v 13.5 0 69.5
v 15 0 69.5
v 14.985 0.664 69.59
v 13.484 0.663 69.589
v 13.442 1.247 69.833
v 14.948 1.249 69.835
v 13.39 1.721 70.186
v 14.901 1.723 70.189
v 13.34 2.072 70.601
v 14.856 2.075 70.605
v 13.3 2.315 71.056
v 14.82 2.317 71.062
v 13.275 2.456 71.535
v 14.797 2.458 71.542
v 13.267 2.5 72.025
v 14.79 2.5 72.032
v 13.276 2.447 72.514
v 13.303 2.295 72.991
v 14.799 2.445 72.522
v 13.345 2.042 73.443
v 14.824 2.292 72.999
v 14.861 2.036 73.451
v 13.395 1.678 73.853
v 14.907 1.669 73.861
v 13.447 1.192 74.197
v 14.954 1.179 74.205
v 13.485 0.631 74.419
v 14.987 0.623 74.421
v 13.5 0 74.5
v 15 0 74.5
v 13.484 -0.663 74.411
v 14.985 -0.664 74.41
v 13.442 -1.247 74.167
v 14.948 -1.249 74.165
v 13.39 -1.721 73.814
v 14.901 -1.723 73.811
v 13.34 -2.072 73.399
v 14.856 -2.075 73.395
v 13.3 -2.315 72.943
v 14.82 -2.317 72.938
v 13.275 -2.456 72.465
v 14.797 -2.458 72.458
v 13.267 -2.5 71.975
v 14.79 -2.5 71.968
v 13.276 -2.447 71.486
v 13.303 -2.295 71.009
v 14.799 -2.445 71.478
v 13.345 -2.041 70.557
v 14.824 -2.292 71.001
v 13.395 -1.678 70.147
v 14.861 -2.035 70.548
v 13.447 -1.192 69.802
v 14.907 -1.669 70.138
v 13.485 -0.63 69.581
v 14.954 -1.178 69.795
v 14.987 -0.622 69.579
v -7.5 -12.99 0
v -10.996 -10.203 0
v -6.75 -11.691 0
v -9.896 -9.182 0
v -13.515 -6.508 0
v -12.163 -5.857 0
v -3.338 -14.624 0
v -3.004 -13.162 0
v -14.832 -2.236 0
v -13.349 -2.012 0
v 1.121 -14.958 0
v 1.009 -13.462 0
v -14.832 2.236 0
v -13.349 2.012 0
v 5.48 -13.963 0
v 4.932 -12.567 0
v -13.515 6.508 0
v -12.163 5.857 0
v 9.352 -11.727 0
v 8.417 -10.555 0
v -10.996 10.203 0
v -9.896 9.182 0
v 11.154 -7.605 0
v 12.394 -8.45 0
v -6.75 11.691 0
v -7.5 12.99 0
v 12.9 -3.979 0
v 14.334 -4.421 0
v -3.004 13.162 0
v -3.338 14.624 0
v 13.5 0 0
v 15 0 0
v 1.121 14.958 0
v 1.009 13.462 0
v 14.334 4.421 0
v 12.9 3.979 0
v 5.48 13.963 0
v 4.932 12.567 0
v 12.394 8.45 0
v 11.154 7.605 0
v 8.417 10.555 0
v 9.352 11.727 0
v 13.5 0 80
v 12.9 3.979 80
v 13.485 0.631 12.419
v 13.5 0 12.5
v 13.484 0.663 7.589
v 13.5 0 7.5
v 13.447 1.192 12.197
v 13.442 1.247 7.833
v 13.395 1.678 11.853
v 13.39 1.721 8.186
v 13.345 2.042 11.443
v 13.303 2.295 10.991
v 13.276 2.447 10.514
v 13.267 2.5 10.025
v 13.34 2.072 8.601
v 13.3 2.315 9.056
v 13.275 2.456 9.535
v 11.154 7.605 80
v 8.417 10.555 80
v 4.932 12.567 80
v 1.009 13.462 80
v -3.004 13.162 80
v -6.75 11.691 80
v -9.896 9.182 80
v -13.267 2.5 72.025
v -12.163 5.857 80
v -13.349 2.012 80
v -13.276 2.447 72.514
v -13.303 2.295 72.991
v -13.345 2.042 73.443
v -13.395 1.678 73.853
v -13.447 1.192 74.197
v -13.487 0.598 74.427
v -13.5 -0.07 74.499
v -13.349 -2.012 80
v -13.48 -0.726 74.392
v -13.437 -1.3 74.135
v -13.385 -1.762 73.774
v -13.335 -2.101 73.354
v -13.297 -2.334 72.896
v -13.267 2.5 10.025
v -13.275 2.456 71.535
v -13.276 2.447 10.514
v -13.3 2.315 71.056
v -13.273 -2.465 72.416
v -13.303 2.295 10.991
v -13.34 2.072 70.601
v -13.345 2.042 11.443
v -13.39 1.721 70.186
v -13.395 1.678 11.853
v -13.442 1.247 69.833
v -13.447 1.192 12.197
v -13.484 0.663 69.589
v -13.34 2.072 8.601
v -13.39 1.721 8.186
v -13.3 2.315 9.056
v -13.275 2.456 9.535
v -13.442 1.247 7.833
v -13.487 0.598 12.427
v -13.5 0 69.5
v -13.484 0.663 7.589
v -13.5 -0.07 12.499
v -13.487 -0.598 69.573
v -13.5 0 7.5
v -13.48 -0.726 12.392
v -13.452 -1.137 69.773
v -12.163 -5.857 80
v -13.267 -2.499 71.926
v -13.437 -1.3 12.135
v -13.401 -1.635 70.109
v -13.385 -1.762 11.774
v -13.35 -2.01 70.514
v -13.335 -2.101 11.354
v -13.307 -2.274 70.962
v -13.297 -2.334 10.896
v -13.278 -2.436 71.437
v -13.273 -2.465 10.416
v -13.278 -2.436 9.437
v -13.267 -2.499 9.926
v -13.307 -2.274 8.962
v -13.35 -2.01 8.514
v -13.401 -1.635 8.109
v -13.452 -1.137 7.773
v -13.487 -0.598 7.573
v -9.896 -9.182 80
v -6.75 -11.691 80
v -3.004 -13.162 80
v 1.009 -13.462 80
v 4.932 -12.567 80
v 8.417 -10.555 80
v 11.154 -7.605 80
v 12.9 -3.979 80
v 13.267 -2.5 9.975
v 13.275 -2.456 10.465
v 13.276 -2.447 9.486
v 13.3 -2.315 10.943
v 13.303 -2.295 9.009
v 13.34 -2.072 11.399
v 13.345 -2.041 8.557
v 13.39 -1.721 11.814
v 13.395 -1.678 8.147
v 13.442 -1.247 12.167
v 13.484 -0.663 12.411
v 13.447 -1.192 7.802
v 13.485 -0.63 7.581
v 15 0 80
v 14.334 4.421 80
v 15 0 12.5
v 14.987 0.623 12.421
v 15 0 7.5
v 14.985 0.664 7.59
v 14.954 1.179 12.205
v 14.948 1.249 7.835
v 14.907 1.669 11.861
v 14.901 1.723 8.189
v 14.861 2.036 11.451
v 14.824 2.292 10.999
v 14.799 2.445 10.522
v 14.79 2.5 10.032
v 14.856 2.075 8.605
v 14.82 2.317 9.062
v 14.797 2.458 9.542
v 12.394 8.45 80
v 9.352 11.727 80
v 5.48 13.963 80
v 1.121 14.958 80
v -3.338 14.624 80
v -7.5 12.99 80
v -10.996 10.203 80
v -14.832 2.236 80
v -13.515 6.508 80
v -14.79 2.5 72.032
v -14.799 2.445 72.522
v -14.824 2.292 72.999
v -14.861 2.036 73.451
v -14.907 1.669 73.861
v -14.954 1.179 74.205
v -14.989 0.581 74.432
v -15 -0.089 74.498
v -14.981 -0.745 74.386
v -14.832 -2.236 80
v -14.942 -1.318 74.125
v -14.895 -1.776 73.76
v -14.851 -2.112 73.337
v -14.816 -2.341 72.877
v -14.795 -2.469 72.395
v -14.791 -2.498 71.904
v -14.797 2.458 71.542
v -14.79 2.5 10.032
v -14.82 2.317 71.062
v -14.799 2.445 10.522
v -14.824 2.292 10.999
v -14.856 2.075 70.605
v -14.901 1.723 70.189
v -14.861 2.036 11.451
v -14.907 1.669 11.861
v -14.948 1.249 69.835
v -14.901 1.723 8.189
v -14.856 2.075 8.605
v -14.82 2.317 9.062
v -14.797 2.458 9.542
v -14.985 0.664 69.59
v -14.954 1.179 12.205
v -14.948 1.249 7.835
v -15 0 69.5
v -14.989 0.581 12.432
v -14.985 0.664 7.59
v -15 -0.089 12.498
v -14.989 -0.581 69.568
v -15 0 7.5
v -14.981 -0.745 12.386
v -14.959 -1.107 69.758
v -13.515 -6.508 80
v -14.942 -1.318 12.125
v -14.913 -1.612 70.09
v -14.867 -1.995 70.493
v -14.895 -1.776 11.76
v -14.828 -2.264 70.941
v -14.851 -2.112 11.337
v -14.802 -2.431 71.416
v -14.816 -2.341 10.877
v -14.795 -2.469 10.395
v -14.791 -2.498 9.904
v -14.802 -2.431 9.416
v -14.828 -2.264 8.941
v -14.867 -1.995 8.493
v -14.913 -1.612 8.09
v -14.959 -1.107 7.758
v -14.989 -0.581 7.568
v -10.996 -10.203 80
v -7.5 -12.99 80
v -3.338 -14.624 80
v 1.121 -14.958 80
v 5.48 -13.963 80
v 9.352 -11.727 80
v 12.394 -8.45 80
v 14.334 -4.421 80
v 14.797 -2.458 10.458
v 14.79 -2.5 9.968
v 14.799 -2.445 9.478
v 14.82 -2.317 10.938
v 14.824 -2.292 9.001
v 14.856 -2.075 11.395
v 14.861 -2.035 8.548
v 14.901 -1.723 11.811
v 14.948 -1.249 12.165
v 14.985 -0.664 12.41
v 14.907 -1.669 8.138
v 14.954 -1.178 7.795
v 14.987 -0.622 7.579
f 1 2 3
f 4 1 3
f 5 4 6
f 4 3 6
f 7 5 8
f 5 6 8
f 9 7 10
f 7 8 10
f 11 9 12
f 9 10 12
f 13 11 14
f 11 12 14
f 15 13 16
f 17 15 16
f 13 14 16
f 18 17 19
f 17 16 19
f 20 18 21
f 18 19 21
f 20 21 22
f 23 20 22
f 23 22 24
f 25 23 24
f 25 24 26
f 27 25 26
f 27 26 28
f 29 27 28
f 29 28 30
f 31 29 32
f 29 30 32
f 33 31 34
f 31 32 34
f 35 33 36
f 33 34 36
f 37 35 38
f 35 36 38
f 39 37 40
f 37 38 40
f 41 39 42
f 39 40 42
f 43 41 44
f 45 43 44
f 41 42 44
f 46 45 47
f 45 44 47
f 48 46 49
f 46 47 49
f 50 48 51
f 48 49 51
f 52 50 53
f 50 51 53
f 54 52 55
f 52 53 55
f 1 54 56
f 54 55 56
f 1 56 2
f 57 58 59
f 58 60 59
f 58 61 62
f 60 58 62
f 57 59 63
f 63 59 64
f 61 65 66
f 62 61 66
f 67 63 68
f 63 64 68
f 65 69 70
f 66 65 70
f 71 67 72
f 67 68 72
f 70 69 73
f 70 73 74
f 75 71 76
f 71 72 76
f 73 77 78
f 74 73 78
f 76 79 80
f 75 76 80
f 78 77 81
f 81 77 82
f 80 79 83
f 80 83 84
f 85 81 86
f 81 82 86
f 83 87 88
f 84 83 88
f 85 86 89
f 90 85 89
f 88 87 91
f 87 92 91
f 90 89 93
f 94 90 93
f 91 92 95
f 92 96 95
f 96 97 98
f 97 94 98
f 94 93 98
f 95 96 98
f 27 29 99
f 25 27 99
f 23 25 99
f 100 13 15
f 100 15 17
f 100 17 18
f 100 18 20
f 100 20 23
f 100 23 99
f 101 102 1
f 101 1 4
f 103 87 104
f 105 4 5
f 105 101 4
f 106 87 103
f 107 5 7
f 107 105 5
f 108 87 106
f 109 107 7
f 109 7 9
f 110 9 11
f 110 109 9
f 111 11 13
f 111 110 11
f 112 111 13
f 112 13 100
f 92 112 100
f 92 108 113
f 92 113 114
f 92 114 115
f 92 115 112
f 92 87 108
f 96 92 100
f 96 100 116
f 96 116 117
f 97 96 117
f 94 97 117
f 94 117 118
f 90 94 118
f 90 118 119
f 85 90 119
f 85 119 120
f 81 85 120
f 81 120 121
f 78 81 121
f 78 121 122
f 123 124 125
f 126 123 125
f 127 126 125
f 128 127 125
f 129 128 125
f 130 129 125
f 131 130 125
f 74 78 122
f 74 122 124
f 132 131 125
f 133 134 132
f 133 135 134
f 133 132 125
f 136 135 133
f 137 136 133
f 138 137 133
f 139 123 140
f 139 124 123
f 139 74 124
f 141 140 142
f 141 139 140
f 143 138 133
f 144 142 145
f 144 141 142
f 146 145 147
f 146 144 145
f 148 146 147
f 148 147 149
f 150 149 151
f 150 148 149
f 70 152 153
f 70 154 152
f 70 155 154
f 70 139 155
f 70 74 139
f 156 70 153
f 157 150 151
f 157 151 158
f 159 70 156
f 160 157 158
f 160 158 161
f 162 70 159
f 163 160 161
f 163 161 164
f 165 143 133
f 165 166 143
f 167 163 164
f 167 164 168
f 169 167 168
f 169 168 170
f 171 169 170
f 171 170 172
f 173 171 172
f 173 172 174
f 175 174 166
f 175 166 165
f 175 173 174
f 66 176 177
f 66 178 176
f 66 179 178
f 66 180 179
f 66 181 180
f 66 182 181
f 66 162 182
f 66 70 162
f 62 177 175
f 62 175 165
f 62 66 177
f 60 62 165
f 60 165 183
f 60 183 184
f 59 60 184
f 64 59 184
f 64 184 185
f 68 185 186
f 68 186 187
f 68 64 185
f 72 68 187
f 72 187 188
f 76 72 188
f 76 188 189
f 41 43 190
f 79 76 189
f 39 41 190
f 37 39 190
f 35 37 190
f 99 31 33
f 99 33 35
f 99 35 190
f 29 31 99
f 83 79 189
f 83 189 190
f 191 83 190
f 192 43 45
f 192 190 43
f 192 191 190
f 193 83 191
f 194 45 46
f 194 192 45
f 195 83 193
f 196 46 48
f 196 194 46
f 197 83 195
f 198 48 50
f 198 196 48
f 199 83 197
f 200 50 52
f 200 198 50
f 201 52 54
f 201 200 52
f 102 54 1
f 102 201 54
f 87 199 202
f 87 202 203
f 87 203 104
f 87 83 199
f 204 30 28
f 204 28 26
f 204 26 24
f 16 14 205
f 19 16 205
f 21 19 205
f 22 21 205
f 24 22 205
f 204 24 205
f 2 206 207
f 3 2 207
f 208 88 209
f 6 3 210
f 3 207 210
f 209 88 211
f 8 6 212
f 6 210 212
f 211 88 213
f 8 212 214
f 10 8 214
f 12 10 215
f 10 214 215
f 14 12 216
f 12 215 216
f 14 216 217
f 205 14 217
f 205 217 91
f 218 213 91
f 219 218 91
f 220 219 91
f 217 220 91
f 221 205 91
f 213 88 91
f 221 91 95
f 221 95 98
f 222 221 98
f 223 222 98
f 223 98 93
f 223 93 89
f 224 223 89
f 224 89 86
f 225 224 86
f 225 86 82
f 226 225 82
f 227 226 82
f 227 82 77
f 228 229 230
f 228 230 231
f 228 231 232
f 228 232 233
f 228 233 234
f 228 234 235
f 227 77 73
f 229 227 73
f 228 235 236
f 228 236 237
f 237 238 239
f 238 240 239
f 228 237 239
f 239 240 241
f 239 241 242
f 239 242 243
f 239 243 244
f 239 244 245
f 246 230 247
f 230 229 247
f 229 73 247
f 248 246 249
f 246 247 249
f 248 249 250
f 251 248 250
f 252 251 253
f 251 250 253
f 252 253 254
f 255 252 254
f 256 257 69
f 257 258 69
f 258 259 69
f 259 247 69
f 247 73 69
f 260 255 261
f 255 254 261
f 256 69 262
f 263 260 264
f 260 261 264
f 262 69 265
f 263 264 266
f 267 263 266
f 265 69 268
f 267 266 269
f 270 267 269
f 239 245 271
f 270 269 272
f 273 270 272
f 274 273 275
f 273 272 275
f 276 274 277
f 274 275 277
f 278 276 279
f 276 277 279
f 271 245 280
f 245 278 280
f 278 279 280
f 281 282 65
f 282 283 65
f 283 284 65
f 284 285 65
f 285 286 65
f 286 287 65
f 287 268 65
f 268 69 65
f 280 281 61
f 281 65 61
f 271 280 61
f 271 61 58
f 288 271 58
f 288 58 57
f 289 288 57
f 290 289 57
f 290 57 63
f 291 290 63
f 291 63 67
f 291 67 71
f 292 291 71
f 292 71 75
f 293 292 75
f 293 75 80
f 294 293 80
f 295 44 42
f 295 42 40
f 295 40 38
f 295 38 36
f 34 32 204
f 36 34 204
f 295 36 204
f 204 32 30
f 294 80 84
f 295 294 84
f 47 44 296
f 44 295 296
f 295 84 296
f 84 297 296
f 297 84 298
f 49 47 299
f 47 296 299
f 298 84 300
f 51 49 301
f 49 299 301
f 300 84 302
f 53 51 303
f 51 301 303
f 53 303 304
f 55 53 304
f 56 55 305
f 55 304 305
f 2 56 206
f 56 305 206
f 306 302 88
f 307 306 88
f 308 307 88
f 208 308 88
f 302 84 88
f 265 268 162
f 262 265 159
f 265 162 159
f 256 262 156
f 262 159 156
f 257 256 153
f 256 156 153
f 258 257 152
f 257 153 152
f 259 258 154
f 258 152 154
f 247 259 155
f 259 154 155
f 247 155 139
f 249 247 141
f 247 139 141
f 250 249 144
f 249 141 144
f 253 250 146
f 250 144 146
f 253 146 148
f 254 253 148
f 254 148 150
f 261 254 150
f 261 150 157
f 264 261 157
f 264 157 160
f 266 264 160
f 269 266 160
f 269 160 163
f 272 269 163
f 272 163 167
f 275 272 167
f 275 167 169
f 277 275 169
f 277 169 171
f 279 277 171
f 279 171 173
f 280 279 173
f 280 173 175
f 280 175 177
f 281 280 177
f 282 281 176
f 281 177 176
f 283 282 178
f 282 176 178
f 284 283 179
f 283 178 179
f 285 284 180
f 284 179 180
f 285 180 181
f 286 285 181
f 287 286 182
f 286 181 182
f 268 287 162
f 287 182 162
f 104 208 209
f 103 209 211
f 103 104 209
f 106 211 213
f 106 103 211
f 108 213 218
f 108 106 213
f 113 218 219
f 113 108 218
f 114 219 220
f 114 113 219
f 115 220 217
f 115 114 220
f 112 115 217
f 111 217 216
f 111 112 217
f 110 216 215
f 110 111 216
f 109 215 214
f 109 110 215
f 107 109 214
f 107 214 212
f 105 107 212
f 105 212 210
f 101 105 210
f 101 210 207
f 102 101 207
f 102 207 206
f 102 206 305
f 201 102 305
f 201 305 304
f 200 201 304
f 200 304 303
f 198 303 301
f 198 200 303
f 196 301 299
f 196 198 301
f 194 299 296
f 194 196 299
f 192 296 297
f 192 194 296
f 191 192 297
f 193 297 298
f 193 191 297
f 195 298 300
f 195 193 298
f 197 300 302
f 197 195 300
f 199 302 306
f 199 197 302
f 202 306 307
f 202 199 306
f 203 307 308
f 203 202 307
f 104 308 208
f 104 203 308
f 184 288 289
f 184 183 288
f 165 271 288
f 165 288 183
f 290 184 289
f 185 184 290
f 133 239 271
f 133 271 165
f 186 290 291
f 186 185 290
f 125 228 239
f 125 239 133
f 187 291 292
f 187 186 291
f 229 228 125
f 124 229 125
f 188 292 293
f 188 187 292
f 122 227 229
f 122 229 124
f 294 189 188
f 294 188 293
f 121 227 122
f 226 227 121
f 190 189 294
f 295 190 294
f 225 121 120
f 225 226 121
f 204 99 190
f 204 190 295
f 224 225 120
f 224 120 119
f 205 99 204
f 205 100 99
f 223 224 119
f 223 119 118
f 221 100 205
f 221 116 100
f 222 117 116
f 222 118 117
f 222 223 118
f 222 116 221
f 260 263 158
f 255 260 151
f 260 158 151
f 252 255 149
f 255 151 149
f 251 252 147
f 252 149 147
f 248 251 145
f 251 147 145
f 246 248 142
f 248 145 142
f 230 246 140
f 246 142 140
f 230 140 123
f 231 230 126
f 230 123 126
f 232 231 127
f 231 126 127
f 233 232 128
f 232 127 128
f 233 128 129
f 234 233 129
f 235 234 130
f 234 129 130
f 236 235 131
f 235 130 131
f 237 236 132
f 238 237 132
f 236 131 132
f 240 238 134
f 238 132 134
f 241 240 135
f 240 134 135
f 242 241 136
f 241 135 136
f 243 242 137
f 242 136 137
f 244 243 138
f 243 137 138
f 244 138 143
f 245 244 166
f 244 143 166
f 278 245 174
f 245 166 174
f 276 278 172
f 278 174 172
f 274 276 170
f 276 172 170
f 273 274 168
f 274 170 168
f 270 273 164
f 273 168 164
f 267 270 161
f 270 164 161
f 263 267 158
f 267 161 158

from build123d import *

# Parameters (mm, degrees)
SKETCH1_R           = 15
SKETCH1_R_2         = 13.5
BOSS_EXTRUDE1_DEPTH = 80
SKETCH2_R           = 2.5
CUT_EXTRUDE1_DEPTH  = 27


with BuildPart() as part:
    # Sketch1 → Boss-Extrude1 (new body)
    with BuildSketch(Plane.XY):
        Circle(SKETCH1_R)
        Circle(SKETCH1_R_2, mode=Mode.SUBTRACT)
    extrude(amount=BOSS_EXTRUDE1_DEPTH)

    # Sketch2 → Cut-Extrude1 (cut, symmetric)
    with BuildSketch(Plane(origin=(0, 0, 0), x_dir=(0, 0, -1), z_dir=(1, 0, 0))):
        with Locations((-10, 0)):
            Circle(SKETCH2_R)
        with Locations((-72, 0)):
            Circle(SKETCH2_R)
    extrude(amount=CUT_EXTRUDE1_DEPTH, both=True, mode=Mode.SUBTRACT)


solid = part.part
